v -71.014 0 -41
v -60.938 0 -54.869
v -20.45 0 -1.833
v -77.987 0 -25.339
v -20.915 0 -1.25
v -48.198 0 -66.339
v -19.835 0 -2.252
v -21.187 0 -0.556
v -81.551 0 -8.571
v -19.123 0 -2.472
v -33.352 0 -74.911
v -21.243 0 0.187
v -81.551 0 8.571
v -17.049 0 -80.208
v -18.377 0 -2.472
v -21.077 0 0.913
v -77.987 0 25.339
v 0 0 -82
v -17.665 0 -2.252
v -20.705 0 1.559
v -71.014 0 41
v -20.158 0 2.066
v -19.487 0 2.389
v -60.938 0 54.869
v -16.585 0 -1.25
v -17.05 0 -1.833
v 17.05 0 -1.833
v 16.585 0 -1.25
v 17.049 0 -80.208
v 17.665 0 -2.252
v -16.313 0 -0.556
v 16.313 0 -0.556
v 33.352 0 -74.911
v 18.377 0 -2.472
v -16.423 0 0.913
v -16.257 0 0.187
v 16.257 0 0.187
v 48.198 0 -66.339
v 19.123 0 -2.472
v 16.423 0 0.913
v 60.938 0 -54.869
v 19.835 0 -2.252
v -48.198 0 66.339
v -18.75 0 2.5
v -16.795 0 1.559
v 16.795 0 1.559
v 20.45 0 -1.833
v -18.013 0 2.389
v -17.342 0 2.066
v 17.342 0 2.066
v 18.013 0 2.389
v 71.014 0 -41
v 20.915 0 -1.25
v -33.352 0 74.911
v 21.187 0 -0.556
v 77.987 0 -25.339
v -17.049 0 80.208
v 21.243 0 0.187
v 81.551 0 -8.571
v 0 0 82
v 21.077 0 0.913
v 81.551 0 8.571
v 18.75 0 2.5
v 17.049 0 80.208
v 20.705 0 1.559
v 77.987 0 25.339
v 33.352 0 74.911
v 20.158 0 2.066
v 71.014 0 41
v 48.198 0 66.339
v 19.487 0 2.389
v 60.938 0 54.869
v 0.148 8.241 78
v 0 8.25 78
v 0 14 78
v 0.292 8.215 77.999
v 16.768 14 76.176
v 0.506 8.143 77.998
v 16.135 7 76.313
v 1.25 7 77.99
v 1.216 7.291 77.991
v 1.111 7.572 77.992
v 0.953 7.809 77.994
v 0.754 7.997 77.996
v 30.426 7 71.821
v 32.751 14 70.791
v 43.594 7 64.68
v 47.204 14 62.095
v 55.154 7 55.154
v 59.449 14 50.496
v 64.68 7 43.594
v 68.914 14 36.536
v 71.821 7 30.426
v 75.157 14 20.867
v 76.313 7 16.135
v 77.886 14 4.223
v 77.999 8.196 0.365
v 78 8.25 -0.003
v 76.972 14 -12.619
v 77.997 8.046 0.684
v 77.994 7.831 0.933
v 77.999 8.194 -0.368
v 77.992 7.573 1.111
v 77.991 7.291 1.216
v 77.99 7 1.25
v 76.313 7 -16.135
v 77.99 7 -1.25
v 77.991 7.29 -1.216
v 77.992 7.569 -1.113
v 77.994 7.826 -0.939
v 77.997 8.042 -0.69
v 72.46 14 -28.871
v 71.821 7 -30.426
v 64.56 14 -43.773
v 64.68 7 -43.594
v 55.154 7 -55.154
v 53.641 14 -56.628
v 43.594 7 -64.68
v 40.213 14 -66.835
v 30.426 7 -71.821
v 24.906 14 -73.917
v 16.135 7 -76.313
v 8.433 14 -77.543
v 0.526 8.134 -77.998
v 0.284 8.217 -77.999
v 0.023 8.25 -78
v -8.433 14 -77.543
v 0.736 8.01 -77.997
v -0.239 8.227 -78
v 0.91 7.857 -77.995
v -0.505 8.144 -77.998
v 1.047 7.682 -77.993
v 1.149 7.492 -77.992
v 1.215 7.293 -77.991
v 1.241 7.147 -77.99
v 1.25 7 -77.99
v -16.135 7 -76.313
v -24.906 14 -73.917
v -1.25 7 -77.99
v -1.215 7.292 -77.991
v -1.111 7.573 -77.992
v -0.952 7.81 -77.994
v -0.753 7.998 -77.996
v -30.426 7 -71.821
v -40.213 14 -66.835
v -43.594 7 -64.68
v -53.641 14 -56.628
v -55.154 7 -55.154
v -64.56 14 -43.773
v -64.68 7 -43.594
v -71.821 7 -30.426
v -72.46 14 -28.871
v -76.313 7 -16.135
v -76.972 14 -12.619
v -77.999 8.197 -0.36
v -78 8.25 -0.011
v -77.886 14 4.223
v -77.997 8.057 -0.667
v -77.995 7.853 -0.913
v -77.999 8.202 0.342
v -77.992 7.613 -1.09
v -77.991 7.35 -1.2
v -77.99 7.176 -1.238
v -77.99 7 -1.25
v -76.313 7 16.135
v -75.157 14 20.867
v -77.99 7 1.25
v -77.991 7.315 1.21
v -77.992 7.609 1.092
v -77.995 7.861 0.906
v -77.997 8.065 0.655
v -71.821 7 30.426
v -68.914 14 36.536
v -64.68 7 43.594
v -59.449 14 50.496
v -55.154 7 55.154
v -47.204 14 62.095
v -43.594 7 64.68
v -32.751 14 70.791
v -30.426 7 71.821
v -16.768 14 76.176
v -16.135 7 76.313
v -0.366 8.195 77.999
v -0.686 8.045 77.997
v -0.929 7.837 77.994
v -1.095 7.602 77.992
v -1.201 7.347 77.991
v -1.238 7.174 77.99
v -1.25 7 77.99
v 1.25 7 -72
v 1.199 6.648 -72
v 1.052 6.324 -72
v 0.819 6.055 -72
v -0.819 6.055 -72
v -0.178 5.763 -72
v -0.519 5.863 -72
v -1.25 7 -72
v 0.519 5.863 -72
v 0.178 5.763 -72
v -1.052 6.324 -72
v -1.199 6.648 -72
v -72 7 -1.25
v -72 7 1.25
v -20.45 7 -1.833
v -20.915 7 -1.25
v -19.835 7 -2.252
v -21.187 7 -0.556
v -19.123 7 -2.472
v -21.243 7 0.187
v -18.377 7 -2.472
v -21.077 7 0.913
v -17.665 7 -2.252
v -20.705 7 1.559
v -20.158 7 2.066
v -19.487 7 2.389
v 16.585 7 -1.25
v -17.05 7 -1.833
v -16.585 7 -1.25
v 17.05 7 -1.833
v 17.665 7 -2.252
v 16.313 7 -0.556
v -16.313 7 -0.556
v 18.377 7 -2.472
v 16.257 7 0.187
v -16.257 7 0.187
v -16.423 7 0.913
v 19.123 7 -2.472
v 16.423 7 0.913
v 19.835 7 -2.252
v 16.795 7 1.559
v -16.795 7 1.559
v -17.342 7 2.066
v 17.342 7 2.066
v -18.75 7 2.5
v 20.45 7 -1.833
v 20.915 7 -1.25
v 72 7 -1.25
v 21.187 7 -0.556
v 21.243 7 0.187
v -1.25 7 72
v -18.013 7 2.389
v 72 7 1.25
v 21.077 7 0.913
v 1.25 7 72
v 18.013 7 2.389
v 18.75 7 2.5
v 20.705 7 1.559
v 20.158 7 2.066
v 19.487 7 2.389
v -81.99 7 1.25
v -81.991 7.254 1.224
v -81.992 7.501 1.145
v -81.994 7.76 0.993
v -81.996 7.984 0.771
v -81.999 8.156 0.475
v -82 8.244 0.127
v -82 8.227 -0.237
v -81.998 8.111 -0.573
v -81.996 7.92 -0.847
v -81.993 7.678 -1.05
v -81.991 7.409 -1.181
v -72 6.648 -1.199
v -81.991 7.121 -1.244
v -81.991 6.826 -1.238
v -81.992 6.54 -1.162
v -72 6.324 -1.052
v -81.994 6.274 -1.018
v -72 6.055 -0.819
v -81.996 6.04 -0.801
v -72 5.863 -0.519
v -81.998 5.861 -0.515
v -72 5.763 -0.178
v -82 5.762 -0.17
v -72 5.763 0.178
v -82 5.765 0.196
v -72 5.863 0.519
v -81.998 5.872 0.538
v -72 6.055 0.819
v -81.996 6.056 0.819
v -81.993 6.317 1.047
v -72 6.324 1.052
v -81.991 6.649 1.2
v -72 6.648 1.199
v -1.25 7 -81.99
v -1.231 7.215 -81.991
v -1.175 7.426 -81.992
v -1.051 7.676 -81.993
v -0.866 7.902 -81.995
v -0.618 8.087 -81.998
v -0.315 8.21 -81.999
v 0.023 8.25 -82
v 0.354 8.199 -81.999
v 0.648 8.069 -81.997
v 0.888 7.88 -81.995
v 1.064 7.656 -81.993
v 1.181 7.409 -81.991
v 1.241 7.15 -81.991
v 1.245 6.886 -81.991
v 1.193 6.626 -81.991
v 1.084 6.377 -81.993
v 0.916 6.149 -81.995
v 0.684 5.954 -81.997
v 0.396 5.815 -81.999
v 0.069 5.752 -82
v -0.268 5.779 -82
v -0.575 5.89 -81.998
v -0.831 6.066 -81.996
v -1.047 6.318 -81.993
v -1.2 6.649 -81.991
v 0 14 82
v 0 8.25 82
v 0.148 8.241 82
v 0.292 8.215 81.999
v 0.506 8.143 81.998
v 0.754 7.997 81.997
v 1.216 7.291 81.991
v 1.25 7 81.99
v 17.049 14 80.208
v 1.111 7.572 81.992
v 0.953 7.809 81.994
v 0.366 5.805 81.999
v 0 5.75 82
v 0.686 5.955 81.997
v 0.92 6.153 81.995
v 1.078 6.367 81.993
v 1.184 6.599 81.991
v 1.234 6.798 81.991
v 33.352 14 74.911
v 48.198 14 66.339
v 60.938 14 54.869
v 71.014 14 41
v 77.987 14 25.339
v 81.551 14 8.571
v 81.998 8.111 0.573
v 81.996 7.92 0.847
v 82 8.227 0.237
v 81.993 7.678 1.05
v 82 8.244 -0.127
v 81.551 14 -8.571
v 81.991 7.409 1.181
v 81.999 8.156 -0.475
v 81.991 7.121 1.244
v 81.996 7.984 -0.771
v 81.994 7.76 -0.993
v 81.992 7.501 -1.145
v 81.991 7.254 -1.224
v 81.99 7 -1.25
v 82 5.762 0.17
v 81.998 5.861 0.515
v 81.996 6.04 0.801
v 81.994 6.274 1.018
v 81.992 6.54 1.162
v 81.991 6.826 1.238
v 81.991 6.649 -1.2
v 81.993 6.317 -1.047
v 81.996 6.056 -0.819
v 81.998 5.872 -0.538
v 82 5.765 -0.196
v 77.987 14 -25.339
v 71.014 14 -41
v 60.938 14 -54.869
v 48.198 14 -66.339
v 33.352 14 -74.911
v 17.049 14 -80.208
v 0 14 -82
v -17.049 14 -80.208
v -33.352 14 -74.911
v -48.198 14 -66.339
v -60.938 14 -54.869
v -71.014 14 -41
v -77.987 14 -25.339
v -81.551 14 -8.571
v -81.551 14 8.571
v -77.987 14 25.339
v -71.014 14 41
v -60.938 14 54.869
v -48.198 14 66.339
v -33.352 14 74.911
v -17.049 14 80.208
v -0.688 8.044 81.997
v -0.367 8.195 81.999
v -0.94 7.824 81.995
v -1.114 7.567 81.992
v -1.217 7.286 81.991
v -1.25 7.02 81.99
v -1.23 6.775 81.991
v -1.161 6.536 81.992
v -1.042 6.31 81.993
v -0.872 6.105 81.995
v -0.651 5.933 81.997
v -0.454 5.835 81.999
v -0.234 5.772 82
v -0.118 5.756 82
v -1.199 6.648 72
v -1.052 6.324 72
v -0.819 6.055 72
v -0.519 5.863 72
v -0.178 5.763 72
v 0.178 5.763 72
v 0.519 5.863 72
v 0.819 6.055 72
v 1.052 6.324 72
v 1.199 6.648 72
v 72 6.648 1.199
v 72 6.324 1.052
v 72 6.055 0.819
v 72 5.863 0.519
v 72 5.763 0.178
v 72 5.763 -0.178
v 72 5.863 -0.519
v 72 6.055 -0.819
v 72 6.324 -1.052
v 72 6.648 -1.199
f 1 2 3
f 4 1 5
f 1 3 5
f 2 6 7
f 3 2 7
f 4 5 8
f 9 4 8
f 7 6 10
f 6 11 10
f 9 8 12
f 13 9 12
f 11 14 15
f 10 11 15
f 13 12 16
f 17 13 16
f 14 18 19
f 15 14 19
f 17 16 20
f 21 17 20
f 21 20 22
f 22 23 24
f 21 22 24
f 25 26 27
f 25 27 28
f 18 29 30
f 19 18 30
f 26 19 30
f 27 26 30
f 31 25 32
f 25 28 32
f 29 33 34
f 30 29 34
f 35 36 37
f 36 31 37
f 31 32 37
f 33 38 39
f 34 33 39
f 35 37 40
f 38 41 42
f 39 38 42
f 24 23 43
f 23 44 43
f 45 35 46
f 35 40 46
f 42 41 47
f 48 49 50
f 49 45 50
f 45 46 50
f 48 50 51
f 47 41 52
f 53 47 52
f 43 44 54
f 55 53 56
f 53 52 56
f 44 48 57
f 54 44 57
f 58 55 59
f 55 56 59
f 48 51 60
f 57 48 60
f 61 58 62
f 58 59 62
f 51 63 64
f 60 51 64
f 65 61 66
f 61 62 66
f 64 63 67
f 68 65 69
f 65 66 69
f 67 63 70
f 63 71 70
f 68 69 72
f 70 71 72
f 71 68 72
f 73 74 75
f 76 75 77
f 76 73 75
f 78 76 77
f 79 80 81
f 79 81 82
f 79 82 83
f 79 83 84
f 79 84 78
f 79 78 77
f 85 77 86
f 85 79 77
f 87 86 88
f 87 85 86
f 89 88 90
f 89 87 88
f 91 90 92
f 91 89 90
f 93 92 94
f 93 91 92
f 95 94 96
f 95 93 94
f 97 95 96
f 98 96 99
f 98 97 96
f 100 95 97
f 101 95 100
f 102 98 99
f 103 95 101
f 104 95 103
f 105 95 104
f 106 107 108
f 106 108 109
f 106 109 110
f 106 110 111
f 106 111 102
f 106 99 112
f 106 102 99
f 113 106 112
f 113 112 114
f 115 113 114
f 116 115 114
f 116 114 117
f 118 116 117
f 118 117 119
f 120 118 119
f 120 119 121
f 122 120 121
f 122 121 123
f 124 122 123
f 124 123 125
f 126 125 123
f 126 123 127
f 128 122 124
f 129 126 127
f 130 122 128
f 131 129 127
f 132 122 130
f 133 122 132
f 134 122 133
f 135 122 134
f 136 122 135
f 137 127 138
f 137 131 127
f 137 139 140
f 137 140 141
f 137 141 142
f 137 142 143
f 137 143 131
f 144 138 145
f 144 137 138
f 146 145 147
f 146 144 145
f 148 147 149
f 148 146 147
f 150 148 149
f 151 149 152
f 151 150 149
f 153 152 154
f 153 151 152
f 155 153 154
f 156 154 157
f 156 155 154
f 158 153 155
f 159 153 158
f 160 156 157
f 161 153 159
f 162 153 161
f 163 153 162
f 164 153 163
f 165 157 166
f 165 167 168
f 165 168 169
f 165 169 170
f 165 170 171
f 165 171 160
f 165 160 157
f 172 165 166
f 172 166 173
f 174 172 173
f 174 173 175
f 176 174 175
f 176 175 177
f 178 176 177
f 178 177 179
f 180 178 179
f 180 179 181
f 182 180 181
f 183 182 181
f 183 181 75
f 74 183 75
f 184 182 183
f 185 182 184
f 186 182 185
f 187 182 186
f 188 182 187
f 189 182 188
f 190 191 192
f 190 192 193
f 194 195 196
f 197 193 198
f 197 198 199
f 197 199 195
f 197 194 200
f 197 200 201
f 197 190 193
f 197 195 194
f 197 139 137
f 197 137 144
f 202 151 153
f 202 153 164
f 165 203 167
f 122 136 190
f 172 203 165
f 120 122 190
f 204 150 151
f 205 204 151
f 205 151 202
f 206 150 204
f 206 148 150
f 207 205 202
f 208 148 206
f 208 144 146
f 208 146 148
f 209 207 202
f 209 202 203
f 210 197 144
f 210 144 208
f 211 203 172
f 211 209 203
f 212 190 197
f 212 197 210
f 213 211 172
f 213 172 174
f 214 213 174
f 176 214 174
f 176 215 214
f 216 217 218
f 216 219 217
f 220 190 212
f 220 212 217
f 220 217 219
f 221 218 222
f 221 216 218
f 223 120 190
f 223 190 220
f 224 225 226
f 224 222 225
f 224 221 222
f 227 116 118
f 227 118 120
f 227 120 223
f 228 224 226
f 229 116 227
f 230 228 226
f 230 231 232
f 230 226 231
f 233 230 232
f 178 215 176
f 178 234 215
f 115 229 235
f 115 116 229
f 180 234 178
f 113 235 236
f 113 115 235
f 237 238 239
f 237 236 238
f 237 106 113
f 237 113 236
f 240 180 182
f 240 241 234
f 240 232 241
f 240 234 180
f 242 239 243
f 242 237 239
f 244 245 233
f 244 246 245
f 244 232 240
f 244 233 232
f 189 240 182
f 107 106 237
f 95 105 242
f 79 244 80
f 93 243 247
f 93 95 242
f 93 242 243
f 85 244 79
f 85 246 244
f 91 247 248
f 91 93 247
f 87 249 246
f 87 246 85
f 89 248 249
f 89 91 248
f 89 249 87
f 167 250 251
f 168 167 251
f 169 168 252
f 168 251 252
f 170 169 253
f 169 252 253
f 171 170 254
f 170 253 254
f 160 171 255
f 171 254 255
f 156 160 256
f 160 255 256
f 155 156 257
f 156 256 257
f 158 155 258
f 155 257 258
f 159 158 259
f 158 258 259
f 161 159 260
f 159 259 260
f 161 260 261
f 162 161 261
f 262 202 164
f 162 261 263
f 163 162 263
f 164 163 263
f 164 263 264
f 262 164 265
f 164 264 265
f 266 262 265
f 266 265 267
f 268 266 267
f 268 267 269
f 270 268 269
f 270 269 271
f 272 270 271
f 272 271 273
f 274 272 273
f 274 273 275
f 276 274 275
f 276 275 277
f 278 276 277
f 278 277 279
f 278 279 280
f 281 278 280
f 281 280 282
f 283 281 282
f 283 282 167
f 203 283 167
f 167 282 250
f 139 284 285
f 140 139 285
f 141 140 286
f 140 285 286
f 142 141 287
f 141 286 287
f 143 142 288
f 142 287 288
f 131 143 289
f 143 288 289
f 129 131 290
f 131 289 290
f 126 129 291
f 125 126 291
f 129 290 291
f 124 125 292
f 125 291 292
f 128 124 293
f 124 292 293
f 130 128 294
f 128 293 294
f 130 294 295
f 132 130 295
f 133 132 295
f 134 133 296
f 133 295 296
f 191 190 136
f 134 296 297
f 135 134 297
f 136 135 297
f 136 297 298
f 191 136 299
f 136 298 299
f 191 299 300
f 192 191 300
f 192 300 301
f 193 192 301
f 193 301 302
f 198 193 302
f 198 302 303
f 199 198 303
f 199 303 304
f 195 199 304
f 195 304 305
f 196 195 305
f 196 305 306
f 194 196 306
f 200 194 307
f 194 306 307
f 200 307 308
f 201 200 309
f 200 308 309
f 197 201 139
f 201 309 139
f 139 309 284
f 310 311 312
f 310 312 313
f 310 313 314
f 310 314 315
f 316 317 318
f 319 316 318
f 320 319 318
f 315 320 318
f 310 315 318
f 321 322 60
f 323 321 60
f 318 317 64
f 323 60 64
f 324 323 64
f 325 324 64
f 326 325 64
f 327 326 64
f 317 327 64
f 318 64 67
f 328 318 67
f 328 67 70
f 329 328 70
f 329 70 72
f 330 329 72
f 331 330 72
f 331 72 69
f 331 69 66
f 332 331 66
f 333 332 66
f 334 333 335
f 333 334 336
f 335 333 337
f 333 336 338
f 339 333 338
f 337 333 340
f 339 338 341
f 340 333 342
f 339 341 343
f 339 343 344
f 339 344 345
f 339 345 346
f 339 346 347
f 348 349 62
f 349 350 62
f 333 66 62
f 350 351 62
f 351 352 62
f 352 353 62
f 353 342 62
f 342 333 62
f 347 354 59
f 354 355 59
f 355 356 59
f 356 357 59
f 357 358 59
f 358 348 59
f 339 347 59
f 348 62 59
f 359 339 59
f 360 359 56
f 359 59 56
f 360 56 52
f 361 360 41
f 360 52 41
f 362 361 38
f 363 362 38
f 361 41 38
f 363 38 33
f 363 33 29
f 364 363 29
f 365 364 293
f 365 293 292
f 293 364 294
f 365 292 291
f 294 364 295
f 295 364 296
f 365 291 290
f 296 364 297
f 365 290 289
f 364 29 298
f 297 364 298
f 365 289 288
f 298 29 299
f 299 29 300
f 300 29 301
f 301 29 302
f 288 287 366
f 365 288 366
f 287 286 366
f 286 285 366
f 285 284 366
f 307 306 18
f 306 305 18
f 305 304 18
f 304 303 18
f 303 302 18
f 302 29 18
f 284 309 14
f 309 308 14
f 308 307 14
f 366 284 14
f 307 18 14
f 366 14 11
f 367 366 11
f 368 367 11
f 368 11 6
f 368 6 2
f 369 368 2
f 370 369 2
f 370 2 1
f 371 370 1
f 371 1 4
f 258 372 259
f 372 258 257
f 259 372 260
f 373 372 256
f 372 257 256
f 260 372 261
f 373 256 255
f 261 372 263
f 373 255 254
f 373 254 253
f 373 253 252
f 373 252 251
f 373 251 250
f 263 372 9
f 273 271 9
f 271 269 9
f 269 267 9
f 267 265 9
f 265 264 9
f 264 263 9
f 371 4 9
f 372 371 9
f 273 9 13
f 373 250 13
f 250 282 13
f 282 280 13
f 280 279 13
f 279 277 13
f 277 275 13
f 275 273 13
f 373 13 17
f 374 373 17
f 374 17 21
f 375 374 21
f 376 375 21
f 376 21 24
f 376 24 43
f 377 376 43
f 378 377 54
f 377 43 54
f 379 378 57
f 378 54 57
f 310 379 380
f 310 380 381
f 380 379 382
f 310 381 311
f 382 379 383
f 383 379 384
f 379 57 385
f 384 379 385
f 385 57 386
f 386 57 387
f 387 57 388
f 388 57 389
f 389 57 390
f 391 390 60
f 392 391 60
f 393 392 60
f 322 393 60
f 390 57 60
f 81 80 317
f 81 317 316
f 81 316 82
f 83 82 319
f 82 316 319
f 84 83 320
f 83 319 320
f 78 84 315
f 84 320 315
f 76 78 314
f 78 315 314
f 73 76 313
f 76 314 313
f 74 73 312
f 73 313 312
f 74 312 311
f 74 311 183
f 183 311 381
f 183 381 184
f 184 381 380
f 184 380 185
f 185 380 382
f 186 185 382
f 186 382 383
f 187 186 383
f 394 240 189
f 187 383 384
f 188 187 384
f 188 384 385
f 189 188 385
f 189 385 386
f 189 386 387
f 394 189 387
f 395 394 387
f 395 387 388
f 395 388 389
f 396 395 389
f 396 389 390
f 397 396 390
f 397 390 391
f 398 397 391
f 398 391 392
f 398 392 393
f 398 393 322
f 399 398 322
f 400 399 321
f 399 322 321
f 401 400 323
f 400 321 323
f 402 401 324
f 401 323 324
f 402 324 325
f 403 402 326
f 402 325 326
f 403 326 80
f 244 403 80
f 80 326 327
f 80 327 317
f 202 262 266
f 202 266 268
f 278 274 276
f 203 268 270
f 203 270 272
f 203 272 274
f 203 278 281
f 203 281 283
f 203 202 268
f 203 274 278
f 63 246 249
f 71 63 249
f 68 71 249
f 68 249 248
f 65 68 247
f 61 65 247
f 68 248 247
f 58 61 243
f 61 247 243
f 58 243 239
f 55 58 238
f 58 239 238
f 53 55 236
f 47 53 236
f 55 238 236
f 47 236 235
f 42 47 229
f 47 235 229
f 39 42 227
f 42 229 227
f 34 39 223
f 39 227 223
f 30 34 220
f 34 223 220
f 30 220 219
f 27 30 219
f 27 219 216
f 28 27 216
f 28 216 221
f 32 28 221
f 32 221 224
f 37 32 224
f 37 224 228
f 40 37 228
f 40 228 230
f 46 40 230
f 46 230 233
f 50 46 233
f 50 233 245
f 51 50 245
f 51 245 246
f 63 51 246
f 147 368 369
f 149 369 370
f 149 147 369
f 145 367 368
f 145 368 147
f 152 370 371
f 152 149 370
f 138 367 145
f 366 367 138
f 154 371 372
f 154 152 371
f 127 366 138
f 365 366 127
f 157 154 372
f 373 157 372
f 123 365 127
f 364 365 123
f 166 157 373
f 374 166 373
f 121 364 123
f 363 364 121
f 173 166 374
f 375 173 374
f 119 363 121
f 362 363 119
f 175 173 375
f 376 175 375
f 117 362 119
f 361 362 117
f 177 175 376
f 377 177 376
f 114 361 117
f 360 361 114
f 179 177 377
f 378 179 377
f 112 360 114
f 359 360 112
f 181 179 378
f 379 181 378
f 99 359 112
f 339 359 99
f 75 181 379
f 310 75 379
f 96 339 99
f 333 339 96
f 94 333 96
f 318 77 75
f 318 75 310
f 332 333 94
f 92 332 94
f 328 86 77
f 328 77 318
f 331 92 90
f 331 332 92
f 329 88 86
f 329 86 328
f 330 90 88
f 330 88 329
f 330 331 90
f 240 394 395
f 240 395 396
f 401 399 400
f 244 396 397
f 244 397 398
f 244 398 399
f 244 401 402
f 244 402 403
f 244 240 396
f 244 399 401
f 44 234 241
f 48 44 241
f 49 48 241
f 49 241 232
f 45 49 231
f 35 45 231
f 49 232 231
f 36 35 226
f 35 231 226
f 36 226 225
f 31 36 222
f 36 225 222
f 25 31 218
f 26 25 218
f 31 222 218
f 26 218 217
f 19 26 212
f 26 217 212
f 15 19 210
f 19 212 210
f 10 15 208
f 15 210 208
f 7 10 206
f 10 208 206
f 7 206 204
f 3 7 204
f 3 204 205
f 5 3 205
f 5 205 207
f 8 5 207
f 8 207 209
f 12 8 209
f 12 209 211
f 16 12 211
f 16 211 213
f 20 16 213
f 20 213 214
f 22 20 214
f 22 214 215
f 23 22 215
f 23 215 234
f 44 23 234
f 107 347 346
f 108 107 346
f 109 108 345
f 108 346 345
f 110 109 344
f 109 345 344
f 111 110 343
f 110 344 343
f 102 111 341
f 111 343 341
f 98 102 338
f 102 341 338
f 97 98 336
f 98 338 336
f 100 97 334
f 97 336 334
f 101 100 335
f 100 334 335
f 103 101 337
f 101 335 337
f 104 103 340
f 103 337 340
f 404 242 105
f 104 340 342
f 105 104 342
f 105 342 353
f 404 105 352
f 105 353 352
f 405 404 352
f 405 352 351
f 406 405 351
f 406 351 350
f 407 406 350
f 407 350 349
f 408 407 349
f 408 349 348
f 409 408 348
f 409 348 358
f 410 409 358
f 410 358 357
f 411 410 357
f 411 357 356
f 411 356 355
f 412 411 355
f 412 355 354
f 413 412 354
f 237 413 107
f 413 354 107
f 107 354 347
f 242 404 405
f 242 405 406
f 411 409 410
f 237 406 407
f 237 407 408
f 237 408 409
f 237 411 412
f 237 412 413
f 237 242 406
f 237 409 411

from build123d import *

# Parameters (mm, degrees)
SKETCH1_R           = 82
BOSS_EXTRUDE1_DEPTH = 7
SKETCH2_R           = 2.5
CUT_EXTRUDE1_DEPTH  = 10
SKETCH3_R           = 82
SKETCH3_R_2         = 78
BOSS_EXTRUDE2_DEPTH = 7
SKETCH4_R           = 1.25
CUT_EXTRUDE3_DEPTH  = 10
CIRPATTERN1_COUNT   = 4


with BuildPart() as part:
    # Sketch1 → Boss-Extrude1 (new body)
    with BuildSketch(Plane(origin=(0, 0, 0), x_dir=(1, 0, 0), z_dir=(0, 1, 0))):
        with Locations(Location((0, 0, 0), (0, 0, 270))):
            Circle(SKETCH1_R)
    extrude(amount=BOSS_EXTRUDE1_DEPTH)

    # Sketch2 → Cut-Extrude1 (cut)
    with BuildSketch(Plane(origin=(0, 7, 0), x_dir=(1, 0, 0), z_dir=(0, 1, 0))):
        with Locations(Location((-18.75, 0, 0), (0, 0, 270))):
            Circle(SKETCH2_R)
        with Locations(Location((18.75, 0, 0), (0, 0, 270))):
            Circle(SKETCH2_R)
    extrude(amount=-CUT_EXTRUDE1_DEPTH, mode=Mode.SUBTRACT)

    # Sketch3 → Boss-Extrude2 (add)
    with BuildSketch(Plane(origin=(0, 7, 0), x_dir=(1, 0, 0), z_dir=(0, 1, 0))):
        with Locations(Location((0, 0, 0), (0, 0, 270))):
            Circle(SKETCH3_R)
        with Locations(Location((0, 0, 0), (0, 0, 270))):
            Circle(SKETCH3_R_2, mode=Mode.SUBTRACT)
    extrude(amount=BOSS_EXTRUDE2_DEPTH)

    # Sketch4 → Cut-Extrude3 (cut)
    with BuildSketch(Plane(origin=(82, 0, 0), x_dir=(0, 0, -1), z_dir=(1, 0, 0))):
        with Locations((0, 7)):
            Circle(SKETCH4_R)
    cut_extrude3 = extrude(amount=-CUT_EXTRUDE3_DEPTH, mode=Mode.SUBTRACT)

    # CirPattern1: Cut-Extrude3 ×4 about axis
    cirpattern1_axis = Axis((0, 0, 0), (0, 1, 0))
    for i in range(1, CIRPATTERN1_COUNT):
        add(cut_extrude3.rotate(cirpattern1_axis, i * 360 / CIRPATTERN1_COUNT), mode=Mode.SUBTRACT)


solid = part.part
